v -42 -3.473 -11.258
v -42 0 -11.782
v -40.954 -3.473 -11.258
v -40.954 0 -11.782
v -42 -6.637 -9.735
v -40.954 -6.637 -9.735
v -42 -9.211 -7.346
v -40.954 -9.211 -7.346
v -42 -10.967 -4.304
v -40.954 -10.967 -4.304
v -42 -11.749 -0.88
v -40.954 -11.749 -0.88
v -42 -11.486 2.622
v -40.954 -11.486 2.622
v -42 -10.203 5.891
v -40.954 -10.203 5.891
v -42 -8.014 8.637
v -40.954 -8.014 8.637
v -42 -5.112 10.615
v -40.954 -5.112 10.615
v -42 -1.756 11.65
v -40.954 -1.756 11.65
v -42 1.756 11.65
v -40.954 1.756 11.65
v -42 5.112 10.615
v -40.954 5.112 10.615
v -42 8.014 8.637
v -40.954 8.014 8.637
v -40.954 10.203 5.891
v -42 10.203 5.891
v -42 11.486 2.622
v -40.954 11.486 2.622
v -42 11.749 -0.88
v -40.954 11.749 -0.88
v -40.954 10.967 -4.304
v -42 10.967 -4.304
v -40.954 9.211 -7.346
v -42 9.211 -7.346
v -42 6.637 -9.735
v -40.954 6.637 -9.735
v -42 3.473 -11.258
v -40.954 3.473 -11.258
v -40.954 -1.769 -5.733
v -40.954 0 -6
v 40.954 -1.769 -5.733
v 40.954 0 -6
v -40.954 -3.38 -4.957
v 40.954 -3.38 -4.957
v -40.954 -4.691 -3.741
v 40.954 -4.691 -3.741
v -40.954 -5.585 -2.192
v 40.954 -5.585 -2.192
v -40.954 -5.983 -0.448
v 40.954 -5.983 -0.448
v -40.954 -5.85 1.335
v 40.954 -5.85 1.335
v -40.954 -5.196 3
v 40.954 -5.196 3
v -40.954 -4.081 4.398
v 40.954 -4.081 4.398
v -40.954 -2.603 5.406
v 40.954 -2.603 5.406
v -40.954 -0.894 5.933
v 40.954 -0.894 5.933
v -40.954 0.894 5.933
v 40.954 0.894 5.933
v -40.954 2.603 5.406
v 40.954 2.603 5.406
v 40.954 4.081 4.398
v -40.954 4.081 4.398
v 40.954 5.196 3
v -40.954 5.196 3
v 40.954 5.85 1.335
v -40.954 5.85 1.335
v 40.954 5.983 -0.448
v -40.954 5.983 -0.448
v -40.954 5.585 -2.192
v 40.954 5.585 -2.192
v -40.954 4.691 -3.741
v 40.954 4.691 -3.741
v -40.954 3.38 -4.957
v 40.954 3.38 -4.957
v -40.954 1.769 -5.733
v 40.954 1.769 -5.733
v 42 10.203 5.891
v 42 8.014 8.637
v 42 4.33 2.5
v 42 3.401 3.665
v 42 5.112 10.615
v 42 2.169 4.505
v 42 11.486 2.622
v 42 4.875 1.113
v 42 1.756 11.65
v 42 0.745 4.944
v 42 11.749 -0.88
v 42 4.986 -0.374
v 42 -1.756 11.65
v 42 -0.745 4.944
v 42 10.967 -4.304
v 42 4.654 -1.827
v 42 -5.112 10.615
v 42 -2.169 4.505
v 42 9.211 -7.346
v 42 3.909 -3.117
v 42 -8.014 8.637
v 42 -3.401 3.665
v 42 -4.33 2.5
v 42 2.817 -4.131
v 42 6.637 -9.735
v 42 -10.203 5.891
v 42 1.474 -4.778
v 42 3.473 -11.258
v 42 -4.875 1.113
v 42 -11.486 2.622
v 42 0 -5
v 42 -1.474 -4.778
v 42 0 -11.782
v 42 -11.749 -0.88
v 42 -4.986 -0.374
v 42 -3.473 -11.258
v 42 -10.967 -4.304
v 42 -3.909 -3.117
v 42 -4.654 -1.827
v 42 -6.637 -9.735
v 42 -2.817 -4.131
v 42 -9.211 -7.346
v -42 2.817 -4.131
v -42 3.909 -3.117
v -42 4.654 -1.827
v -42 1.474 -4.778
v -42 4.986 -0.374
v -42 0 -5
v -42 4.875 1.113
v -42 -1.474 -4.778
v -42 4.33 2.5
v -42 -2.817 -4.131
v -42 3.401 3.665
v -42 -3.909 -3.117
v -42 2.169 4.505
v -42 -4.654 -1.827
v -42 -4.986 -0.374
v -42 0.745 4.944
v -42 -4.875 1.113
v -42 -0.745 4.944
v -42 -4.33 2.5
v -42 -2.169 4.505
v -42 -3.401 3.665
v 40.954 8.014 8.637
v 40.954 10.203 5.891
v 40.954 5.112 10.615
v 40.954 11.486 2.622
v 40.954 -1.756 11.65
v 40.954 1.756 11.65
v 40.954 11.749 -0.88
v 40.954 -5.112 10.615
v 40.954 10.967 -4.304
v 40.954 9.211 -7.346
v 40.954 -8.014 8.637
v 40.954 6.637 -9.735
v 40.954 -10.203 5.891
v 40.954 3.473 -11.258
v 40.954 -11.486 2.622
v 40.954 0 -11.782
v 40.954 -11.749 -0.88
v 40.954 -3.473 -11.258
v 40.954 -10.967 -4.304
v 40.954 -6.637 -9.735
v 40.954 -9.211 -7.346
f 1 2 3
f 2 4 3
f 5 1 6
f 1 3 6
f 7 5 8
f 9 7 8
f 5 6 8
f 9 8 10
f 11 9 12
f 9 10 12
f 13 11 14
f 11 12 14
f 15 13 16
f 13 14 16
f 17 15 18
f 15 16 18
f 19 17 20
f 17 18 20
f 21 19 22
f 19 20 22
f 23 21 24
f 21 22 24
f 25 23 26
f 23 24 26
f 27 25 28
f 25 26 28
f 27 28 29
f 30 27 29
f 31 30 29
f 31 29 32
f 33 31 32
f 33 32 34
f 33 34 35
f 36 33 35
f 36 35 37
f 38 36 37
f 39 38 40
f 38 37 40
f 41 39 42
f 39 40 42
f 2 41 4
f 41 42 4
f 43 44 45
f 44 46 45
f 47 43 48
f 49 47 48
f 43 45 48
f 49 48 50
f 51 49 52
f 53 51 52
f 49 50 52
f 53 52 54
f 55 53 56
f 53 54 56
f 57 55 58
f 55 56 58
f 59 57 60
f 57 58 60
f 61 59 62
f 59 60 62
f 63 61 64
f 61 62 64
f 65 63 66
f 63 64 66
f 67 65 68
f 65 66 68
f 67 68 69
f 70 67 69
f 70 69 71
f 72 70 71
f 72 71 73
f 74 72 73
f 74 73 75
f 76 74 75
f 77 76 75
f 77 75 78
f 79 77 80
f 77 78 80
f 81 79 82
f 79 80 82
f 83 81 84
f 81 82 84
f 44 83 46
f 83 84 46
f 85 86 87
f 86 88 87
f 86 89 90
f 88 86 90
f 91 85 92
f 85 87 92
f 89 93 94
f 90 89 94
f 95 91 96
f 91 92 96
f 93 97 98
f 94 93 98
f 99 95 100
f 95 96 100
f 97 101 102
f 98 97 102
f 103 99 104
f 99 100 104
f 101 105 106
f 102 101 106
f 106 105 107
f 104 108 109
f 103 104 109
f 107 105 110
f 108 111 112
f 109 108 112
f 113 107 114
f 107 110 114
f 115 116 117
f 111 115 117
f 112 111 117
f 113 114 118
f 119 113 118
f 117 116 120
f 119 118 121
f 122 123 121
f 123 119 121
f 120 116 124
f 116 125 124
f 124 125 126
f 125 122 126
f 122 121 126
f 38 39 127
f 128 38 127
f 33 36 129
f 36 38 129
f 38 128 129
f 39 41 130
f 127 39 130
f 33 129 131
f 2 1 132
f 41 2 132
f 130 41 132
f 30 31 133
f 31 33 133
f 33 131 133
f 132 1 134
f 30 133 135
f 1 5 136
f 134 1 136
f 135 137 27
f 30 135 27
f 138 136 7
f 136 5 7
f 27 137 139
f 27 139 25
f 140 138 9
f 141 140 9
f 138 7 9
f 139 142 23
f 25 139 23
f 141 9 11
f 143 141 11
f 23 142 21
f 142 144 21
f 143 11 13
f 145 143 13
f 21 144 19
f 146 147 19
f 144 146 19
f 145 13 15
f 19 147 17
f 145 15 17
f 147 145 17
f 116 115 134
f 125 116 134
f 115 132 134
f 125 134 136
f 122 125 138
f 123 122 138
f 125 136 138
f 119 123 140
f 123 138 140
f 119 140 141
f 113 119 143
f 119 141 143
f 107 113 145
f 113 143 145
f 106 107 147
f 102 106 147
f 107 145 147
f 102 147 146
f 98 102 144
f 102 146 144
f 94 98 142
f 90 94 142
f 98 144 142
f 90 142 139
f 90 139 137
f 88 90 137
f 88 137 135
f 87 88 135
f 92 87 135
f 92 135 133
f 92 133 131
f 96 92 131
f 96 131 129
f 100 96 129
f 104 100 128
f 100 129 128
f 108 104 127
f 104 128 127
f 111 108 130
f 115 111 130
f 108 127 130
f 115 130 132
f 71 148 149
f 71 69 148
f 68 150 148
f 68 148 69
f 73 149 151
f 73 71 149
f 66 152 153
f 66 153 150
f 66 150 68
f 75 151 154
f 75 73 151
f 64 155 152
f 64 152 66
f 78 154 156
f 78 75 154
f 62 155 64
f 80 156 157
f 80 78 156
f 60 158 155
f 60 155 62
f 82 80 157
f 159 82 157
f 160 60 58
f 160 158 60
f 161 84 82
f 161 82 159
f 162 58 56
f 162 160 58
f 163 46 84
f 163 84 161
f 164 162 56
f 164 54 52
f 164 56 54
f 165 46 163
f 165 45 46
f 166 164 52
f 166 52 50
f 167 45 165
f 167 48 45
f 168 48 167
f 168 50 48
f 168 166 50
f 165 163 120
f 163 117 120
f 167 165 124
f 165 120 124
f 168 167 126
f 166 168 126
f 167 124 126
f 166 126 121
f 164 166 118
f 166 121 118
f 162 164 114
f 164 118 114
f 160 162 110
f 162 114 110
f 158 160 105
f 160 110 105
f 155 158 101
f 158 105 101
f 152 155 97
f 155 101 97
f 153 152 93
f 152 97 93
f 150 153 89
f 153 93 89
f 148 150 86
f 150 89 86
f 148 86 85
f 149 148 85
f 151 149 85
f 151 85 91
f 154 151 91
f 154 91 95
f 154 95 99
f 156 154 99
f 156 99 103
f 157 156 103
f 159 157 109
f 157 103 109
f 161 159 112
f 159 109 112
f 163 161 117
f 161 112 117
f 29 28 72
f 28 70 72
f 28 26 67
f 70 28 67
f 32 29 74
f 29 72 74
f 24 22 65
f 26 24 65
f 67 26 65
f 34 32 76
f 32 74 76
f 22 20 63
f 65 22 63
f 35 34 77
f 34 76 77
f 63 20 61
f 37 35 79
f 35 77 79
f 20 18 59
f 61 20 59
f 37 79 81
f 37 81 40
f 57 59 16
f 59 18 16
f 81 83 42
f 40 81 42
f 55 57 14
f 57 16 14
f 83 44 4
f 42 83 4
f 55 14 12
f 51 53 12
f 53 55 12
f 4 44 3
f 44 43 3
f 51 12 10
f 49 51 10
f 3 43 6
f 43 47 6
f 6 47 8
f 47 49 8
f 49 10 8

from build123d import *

# Parameters (mm, degrees)
F0_W = 1.0458609164
F0_H = 5.7817278951


with BuildPart() as f1:
    # F0 (on Front) → F1 (revolve)
    with BuildSketch(Plane.XZ):
        with Locations((-41.4770695418, -8.8908639476)):
            Rectangle(F0_W, F0_H)
        Polygon((0, -6), (0, -5), (-42, -5), (-42, -6), (-40.9541390836, -6), align=None)
        with Locations((41.4770695418, -8.8908639476)):
            Rectangle(F0_W, F0_H)
        Polygon((42, -5), (0, -5), (0, -6), (40.9541390836, -6), (42, -6), align=None)
    revolve(axis=Axis((-5.3423042409, 0, 0), (-1, 0, 0)))


solid = f1.part
